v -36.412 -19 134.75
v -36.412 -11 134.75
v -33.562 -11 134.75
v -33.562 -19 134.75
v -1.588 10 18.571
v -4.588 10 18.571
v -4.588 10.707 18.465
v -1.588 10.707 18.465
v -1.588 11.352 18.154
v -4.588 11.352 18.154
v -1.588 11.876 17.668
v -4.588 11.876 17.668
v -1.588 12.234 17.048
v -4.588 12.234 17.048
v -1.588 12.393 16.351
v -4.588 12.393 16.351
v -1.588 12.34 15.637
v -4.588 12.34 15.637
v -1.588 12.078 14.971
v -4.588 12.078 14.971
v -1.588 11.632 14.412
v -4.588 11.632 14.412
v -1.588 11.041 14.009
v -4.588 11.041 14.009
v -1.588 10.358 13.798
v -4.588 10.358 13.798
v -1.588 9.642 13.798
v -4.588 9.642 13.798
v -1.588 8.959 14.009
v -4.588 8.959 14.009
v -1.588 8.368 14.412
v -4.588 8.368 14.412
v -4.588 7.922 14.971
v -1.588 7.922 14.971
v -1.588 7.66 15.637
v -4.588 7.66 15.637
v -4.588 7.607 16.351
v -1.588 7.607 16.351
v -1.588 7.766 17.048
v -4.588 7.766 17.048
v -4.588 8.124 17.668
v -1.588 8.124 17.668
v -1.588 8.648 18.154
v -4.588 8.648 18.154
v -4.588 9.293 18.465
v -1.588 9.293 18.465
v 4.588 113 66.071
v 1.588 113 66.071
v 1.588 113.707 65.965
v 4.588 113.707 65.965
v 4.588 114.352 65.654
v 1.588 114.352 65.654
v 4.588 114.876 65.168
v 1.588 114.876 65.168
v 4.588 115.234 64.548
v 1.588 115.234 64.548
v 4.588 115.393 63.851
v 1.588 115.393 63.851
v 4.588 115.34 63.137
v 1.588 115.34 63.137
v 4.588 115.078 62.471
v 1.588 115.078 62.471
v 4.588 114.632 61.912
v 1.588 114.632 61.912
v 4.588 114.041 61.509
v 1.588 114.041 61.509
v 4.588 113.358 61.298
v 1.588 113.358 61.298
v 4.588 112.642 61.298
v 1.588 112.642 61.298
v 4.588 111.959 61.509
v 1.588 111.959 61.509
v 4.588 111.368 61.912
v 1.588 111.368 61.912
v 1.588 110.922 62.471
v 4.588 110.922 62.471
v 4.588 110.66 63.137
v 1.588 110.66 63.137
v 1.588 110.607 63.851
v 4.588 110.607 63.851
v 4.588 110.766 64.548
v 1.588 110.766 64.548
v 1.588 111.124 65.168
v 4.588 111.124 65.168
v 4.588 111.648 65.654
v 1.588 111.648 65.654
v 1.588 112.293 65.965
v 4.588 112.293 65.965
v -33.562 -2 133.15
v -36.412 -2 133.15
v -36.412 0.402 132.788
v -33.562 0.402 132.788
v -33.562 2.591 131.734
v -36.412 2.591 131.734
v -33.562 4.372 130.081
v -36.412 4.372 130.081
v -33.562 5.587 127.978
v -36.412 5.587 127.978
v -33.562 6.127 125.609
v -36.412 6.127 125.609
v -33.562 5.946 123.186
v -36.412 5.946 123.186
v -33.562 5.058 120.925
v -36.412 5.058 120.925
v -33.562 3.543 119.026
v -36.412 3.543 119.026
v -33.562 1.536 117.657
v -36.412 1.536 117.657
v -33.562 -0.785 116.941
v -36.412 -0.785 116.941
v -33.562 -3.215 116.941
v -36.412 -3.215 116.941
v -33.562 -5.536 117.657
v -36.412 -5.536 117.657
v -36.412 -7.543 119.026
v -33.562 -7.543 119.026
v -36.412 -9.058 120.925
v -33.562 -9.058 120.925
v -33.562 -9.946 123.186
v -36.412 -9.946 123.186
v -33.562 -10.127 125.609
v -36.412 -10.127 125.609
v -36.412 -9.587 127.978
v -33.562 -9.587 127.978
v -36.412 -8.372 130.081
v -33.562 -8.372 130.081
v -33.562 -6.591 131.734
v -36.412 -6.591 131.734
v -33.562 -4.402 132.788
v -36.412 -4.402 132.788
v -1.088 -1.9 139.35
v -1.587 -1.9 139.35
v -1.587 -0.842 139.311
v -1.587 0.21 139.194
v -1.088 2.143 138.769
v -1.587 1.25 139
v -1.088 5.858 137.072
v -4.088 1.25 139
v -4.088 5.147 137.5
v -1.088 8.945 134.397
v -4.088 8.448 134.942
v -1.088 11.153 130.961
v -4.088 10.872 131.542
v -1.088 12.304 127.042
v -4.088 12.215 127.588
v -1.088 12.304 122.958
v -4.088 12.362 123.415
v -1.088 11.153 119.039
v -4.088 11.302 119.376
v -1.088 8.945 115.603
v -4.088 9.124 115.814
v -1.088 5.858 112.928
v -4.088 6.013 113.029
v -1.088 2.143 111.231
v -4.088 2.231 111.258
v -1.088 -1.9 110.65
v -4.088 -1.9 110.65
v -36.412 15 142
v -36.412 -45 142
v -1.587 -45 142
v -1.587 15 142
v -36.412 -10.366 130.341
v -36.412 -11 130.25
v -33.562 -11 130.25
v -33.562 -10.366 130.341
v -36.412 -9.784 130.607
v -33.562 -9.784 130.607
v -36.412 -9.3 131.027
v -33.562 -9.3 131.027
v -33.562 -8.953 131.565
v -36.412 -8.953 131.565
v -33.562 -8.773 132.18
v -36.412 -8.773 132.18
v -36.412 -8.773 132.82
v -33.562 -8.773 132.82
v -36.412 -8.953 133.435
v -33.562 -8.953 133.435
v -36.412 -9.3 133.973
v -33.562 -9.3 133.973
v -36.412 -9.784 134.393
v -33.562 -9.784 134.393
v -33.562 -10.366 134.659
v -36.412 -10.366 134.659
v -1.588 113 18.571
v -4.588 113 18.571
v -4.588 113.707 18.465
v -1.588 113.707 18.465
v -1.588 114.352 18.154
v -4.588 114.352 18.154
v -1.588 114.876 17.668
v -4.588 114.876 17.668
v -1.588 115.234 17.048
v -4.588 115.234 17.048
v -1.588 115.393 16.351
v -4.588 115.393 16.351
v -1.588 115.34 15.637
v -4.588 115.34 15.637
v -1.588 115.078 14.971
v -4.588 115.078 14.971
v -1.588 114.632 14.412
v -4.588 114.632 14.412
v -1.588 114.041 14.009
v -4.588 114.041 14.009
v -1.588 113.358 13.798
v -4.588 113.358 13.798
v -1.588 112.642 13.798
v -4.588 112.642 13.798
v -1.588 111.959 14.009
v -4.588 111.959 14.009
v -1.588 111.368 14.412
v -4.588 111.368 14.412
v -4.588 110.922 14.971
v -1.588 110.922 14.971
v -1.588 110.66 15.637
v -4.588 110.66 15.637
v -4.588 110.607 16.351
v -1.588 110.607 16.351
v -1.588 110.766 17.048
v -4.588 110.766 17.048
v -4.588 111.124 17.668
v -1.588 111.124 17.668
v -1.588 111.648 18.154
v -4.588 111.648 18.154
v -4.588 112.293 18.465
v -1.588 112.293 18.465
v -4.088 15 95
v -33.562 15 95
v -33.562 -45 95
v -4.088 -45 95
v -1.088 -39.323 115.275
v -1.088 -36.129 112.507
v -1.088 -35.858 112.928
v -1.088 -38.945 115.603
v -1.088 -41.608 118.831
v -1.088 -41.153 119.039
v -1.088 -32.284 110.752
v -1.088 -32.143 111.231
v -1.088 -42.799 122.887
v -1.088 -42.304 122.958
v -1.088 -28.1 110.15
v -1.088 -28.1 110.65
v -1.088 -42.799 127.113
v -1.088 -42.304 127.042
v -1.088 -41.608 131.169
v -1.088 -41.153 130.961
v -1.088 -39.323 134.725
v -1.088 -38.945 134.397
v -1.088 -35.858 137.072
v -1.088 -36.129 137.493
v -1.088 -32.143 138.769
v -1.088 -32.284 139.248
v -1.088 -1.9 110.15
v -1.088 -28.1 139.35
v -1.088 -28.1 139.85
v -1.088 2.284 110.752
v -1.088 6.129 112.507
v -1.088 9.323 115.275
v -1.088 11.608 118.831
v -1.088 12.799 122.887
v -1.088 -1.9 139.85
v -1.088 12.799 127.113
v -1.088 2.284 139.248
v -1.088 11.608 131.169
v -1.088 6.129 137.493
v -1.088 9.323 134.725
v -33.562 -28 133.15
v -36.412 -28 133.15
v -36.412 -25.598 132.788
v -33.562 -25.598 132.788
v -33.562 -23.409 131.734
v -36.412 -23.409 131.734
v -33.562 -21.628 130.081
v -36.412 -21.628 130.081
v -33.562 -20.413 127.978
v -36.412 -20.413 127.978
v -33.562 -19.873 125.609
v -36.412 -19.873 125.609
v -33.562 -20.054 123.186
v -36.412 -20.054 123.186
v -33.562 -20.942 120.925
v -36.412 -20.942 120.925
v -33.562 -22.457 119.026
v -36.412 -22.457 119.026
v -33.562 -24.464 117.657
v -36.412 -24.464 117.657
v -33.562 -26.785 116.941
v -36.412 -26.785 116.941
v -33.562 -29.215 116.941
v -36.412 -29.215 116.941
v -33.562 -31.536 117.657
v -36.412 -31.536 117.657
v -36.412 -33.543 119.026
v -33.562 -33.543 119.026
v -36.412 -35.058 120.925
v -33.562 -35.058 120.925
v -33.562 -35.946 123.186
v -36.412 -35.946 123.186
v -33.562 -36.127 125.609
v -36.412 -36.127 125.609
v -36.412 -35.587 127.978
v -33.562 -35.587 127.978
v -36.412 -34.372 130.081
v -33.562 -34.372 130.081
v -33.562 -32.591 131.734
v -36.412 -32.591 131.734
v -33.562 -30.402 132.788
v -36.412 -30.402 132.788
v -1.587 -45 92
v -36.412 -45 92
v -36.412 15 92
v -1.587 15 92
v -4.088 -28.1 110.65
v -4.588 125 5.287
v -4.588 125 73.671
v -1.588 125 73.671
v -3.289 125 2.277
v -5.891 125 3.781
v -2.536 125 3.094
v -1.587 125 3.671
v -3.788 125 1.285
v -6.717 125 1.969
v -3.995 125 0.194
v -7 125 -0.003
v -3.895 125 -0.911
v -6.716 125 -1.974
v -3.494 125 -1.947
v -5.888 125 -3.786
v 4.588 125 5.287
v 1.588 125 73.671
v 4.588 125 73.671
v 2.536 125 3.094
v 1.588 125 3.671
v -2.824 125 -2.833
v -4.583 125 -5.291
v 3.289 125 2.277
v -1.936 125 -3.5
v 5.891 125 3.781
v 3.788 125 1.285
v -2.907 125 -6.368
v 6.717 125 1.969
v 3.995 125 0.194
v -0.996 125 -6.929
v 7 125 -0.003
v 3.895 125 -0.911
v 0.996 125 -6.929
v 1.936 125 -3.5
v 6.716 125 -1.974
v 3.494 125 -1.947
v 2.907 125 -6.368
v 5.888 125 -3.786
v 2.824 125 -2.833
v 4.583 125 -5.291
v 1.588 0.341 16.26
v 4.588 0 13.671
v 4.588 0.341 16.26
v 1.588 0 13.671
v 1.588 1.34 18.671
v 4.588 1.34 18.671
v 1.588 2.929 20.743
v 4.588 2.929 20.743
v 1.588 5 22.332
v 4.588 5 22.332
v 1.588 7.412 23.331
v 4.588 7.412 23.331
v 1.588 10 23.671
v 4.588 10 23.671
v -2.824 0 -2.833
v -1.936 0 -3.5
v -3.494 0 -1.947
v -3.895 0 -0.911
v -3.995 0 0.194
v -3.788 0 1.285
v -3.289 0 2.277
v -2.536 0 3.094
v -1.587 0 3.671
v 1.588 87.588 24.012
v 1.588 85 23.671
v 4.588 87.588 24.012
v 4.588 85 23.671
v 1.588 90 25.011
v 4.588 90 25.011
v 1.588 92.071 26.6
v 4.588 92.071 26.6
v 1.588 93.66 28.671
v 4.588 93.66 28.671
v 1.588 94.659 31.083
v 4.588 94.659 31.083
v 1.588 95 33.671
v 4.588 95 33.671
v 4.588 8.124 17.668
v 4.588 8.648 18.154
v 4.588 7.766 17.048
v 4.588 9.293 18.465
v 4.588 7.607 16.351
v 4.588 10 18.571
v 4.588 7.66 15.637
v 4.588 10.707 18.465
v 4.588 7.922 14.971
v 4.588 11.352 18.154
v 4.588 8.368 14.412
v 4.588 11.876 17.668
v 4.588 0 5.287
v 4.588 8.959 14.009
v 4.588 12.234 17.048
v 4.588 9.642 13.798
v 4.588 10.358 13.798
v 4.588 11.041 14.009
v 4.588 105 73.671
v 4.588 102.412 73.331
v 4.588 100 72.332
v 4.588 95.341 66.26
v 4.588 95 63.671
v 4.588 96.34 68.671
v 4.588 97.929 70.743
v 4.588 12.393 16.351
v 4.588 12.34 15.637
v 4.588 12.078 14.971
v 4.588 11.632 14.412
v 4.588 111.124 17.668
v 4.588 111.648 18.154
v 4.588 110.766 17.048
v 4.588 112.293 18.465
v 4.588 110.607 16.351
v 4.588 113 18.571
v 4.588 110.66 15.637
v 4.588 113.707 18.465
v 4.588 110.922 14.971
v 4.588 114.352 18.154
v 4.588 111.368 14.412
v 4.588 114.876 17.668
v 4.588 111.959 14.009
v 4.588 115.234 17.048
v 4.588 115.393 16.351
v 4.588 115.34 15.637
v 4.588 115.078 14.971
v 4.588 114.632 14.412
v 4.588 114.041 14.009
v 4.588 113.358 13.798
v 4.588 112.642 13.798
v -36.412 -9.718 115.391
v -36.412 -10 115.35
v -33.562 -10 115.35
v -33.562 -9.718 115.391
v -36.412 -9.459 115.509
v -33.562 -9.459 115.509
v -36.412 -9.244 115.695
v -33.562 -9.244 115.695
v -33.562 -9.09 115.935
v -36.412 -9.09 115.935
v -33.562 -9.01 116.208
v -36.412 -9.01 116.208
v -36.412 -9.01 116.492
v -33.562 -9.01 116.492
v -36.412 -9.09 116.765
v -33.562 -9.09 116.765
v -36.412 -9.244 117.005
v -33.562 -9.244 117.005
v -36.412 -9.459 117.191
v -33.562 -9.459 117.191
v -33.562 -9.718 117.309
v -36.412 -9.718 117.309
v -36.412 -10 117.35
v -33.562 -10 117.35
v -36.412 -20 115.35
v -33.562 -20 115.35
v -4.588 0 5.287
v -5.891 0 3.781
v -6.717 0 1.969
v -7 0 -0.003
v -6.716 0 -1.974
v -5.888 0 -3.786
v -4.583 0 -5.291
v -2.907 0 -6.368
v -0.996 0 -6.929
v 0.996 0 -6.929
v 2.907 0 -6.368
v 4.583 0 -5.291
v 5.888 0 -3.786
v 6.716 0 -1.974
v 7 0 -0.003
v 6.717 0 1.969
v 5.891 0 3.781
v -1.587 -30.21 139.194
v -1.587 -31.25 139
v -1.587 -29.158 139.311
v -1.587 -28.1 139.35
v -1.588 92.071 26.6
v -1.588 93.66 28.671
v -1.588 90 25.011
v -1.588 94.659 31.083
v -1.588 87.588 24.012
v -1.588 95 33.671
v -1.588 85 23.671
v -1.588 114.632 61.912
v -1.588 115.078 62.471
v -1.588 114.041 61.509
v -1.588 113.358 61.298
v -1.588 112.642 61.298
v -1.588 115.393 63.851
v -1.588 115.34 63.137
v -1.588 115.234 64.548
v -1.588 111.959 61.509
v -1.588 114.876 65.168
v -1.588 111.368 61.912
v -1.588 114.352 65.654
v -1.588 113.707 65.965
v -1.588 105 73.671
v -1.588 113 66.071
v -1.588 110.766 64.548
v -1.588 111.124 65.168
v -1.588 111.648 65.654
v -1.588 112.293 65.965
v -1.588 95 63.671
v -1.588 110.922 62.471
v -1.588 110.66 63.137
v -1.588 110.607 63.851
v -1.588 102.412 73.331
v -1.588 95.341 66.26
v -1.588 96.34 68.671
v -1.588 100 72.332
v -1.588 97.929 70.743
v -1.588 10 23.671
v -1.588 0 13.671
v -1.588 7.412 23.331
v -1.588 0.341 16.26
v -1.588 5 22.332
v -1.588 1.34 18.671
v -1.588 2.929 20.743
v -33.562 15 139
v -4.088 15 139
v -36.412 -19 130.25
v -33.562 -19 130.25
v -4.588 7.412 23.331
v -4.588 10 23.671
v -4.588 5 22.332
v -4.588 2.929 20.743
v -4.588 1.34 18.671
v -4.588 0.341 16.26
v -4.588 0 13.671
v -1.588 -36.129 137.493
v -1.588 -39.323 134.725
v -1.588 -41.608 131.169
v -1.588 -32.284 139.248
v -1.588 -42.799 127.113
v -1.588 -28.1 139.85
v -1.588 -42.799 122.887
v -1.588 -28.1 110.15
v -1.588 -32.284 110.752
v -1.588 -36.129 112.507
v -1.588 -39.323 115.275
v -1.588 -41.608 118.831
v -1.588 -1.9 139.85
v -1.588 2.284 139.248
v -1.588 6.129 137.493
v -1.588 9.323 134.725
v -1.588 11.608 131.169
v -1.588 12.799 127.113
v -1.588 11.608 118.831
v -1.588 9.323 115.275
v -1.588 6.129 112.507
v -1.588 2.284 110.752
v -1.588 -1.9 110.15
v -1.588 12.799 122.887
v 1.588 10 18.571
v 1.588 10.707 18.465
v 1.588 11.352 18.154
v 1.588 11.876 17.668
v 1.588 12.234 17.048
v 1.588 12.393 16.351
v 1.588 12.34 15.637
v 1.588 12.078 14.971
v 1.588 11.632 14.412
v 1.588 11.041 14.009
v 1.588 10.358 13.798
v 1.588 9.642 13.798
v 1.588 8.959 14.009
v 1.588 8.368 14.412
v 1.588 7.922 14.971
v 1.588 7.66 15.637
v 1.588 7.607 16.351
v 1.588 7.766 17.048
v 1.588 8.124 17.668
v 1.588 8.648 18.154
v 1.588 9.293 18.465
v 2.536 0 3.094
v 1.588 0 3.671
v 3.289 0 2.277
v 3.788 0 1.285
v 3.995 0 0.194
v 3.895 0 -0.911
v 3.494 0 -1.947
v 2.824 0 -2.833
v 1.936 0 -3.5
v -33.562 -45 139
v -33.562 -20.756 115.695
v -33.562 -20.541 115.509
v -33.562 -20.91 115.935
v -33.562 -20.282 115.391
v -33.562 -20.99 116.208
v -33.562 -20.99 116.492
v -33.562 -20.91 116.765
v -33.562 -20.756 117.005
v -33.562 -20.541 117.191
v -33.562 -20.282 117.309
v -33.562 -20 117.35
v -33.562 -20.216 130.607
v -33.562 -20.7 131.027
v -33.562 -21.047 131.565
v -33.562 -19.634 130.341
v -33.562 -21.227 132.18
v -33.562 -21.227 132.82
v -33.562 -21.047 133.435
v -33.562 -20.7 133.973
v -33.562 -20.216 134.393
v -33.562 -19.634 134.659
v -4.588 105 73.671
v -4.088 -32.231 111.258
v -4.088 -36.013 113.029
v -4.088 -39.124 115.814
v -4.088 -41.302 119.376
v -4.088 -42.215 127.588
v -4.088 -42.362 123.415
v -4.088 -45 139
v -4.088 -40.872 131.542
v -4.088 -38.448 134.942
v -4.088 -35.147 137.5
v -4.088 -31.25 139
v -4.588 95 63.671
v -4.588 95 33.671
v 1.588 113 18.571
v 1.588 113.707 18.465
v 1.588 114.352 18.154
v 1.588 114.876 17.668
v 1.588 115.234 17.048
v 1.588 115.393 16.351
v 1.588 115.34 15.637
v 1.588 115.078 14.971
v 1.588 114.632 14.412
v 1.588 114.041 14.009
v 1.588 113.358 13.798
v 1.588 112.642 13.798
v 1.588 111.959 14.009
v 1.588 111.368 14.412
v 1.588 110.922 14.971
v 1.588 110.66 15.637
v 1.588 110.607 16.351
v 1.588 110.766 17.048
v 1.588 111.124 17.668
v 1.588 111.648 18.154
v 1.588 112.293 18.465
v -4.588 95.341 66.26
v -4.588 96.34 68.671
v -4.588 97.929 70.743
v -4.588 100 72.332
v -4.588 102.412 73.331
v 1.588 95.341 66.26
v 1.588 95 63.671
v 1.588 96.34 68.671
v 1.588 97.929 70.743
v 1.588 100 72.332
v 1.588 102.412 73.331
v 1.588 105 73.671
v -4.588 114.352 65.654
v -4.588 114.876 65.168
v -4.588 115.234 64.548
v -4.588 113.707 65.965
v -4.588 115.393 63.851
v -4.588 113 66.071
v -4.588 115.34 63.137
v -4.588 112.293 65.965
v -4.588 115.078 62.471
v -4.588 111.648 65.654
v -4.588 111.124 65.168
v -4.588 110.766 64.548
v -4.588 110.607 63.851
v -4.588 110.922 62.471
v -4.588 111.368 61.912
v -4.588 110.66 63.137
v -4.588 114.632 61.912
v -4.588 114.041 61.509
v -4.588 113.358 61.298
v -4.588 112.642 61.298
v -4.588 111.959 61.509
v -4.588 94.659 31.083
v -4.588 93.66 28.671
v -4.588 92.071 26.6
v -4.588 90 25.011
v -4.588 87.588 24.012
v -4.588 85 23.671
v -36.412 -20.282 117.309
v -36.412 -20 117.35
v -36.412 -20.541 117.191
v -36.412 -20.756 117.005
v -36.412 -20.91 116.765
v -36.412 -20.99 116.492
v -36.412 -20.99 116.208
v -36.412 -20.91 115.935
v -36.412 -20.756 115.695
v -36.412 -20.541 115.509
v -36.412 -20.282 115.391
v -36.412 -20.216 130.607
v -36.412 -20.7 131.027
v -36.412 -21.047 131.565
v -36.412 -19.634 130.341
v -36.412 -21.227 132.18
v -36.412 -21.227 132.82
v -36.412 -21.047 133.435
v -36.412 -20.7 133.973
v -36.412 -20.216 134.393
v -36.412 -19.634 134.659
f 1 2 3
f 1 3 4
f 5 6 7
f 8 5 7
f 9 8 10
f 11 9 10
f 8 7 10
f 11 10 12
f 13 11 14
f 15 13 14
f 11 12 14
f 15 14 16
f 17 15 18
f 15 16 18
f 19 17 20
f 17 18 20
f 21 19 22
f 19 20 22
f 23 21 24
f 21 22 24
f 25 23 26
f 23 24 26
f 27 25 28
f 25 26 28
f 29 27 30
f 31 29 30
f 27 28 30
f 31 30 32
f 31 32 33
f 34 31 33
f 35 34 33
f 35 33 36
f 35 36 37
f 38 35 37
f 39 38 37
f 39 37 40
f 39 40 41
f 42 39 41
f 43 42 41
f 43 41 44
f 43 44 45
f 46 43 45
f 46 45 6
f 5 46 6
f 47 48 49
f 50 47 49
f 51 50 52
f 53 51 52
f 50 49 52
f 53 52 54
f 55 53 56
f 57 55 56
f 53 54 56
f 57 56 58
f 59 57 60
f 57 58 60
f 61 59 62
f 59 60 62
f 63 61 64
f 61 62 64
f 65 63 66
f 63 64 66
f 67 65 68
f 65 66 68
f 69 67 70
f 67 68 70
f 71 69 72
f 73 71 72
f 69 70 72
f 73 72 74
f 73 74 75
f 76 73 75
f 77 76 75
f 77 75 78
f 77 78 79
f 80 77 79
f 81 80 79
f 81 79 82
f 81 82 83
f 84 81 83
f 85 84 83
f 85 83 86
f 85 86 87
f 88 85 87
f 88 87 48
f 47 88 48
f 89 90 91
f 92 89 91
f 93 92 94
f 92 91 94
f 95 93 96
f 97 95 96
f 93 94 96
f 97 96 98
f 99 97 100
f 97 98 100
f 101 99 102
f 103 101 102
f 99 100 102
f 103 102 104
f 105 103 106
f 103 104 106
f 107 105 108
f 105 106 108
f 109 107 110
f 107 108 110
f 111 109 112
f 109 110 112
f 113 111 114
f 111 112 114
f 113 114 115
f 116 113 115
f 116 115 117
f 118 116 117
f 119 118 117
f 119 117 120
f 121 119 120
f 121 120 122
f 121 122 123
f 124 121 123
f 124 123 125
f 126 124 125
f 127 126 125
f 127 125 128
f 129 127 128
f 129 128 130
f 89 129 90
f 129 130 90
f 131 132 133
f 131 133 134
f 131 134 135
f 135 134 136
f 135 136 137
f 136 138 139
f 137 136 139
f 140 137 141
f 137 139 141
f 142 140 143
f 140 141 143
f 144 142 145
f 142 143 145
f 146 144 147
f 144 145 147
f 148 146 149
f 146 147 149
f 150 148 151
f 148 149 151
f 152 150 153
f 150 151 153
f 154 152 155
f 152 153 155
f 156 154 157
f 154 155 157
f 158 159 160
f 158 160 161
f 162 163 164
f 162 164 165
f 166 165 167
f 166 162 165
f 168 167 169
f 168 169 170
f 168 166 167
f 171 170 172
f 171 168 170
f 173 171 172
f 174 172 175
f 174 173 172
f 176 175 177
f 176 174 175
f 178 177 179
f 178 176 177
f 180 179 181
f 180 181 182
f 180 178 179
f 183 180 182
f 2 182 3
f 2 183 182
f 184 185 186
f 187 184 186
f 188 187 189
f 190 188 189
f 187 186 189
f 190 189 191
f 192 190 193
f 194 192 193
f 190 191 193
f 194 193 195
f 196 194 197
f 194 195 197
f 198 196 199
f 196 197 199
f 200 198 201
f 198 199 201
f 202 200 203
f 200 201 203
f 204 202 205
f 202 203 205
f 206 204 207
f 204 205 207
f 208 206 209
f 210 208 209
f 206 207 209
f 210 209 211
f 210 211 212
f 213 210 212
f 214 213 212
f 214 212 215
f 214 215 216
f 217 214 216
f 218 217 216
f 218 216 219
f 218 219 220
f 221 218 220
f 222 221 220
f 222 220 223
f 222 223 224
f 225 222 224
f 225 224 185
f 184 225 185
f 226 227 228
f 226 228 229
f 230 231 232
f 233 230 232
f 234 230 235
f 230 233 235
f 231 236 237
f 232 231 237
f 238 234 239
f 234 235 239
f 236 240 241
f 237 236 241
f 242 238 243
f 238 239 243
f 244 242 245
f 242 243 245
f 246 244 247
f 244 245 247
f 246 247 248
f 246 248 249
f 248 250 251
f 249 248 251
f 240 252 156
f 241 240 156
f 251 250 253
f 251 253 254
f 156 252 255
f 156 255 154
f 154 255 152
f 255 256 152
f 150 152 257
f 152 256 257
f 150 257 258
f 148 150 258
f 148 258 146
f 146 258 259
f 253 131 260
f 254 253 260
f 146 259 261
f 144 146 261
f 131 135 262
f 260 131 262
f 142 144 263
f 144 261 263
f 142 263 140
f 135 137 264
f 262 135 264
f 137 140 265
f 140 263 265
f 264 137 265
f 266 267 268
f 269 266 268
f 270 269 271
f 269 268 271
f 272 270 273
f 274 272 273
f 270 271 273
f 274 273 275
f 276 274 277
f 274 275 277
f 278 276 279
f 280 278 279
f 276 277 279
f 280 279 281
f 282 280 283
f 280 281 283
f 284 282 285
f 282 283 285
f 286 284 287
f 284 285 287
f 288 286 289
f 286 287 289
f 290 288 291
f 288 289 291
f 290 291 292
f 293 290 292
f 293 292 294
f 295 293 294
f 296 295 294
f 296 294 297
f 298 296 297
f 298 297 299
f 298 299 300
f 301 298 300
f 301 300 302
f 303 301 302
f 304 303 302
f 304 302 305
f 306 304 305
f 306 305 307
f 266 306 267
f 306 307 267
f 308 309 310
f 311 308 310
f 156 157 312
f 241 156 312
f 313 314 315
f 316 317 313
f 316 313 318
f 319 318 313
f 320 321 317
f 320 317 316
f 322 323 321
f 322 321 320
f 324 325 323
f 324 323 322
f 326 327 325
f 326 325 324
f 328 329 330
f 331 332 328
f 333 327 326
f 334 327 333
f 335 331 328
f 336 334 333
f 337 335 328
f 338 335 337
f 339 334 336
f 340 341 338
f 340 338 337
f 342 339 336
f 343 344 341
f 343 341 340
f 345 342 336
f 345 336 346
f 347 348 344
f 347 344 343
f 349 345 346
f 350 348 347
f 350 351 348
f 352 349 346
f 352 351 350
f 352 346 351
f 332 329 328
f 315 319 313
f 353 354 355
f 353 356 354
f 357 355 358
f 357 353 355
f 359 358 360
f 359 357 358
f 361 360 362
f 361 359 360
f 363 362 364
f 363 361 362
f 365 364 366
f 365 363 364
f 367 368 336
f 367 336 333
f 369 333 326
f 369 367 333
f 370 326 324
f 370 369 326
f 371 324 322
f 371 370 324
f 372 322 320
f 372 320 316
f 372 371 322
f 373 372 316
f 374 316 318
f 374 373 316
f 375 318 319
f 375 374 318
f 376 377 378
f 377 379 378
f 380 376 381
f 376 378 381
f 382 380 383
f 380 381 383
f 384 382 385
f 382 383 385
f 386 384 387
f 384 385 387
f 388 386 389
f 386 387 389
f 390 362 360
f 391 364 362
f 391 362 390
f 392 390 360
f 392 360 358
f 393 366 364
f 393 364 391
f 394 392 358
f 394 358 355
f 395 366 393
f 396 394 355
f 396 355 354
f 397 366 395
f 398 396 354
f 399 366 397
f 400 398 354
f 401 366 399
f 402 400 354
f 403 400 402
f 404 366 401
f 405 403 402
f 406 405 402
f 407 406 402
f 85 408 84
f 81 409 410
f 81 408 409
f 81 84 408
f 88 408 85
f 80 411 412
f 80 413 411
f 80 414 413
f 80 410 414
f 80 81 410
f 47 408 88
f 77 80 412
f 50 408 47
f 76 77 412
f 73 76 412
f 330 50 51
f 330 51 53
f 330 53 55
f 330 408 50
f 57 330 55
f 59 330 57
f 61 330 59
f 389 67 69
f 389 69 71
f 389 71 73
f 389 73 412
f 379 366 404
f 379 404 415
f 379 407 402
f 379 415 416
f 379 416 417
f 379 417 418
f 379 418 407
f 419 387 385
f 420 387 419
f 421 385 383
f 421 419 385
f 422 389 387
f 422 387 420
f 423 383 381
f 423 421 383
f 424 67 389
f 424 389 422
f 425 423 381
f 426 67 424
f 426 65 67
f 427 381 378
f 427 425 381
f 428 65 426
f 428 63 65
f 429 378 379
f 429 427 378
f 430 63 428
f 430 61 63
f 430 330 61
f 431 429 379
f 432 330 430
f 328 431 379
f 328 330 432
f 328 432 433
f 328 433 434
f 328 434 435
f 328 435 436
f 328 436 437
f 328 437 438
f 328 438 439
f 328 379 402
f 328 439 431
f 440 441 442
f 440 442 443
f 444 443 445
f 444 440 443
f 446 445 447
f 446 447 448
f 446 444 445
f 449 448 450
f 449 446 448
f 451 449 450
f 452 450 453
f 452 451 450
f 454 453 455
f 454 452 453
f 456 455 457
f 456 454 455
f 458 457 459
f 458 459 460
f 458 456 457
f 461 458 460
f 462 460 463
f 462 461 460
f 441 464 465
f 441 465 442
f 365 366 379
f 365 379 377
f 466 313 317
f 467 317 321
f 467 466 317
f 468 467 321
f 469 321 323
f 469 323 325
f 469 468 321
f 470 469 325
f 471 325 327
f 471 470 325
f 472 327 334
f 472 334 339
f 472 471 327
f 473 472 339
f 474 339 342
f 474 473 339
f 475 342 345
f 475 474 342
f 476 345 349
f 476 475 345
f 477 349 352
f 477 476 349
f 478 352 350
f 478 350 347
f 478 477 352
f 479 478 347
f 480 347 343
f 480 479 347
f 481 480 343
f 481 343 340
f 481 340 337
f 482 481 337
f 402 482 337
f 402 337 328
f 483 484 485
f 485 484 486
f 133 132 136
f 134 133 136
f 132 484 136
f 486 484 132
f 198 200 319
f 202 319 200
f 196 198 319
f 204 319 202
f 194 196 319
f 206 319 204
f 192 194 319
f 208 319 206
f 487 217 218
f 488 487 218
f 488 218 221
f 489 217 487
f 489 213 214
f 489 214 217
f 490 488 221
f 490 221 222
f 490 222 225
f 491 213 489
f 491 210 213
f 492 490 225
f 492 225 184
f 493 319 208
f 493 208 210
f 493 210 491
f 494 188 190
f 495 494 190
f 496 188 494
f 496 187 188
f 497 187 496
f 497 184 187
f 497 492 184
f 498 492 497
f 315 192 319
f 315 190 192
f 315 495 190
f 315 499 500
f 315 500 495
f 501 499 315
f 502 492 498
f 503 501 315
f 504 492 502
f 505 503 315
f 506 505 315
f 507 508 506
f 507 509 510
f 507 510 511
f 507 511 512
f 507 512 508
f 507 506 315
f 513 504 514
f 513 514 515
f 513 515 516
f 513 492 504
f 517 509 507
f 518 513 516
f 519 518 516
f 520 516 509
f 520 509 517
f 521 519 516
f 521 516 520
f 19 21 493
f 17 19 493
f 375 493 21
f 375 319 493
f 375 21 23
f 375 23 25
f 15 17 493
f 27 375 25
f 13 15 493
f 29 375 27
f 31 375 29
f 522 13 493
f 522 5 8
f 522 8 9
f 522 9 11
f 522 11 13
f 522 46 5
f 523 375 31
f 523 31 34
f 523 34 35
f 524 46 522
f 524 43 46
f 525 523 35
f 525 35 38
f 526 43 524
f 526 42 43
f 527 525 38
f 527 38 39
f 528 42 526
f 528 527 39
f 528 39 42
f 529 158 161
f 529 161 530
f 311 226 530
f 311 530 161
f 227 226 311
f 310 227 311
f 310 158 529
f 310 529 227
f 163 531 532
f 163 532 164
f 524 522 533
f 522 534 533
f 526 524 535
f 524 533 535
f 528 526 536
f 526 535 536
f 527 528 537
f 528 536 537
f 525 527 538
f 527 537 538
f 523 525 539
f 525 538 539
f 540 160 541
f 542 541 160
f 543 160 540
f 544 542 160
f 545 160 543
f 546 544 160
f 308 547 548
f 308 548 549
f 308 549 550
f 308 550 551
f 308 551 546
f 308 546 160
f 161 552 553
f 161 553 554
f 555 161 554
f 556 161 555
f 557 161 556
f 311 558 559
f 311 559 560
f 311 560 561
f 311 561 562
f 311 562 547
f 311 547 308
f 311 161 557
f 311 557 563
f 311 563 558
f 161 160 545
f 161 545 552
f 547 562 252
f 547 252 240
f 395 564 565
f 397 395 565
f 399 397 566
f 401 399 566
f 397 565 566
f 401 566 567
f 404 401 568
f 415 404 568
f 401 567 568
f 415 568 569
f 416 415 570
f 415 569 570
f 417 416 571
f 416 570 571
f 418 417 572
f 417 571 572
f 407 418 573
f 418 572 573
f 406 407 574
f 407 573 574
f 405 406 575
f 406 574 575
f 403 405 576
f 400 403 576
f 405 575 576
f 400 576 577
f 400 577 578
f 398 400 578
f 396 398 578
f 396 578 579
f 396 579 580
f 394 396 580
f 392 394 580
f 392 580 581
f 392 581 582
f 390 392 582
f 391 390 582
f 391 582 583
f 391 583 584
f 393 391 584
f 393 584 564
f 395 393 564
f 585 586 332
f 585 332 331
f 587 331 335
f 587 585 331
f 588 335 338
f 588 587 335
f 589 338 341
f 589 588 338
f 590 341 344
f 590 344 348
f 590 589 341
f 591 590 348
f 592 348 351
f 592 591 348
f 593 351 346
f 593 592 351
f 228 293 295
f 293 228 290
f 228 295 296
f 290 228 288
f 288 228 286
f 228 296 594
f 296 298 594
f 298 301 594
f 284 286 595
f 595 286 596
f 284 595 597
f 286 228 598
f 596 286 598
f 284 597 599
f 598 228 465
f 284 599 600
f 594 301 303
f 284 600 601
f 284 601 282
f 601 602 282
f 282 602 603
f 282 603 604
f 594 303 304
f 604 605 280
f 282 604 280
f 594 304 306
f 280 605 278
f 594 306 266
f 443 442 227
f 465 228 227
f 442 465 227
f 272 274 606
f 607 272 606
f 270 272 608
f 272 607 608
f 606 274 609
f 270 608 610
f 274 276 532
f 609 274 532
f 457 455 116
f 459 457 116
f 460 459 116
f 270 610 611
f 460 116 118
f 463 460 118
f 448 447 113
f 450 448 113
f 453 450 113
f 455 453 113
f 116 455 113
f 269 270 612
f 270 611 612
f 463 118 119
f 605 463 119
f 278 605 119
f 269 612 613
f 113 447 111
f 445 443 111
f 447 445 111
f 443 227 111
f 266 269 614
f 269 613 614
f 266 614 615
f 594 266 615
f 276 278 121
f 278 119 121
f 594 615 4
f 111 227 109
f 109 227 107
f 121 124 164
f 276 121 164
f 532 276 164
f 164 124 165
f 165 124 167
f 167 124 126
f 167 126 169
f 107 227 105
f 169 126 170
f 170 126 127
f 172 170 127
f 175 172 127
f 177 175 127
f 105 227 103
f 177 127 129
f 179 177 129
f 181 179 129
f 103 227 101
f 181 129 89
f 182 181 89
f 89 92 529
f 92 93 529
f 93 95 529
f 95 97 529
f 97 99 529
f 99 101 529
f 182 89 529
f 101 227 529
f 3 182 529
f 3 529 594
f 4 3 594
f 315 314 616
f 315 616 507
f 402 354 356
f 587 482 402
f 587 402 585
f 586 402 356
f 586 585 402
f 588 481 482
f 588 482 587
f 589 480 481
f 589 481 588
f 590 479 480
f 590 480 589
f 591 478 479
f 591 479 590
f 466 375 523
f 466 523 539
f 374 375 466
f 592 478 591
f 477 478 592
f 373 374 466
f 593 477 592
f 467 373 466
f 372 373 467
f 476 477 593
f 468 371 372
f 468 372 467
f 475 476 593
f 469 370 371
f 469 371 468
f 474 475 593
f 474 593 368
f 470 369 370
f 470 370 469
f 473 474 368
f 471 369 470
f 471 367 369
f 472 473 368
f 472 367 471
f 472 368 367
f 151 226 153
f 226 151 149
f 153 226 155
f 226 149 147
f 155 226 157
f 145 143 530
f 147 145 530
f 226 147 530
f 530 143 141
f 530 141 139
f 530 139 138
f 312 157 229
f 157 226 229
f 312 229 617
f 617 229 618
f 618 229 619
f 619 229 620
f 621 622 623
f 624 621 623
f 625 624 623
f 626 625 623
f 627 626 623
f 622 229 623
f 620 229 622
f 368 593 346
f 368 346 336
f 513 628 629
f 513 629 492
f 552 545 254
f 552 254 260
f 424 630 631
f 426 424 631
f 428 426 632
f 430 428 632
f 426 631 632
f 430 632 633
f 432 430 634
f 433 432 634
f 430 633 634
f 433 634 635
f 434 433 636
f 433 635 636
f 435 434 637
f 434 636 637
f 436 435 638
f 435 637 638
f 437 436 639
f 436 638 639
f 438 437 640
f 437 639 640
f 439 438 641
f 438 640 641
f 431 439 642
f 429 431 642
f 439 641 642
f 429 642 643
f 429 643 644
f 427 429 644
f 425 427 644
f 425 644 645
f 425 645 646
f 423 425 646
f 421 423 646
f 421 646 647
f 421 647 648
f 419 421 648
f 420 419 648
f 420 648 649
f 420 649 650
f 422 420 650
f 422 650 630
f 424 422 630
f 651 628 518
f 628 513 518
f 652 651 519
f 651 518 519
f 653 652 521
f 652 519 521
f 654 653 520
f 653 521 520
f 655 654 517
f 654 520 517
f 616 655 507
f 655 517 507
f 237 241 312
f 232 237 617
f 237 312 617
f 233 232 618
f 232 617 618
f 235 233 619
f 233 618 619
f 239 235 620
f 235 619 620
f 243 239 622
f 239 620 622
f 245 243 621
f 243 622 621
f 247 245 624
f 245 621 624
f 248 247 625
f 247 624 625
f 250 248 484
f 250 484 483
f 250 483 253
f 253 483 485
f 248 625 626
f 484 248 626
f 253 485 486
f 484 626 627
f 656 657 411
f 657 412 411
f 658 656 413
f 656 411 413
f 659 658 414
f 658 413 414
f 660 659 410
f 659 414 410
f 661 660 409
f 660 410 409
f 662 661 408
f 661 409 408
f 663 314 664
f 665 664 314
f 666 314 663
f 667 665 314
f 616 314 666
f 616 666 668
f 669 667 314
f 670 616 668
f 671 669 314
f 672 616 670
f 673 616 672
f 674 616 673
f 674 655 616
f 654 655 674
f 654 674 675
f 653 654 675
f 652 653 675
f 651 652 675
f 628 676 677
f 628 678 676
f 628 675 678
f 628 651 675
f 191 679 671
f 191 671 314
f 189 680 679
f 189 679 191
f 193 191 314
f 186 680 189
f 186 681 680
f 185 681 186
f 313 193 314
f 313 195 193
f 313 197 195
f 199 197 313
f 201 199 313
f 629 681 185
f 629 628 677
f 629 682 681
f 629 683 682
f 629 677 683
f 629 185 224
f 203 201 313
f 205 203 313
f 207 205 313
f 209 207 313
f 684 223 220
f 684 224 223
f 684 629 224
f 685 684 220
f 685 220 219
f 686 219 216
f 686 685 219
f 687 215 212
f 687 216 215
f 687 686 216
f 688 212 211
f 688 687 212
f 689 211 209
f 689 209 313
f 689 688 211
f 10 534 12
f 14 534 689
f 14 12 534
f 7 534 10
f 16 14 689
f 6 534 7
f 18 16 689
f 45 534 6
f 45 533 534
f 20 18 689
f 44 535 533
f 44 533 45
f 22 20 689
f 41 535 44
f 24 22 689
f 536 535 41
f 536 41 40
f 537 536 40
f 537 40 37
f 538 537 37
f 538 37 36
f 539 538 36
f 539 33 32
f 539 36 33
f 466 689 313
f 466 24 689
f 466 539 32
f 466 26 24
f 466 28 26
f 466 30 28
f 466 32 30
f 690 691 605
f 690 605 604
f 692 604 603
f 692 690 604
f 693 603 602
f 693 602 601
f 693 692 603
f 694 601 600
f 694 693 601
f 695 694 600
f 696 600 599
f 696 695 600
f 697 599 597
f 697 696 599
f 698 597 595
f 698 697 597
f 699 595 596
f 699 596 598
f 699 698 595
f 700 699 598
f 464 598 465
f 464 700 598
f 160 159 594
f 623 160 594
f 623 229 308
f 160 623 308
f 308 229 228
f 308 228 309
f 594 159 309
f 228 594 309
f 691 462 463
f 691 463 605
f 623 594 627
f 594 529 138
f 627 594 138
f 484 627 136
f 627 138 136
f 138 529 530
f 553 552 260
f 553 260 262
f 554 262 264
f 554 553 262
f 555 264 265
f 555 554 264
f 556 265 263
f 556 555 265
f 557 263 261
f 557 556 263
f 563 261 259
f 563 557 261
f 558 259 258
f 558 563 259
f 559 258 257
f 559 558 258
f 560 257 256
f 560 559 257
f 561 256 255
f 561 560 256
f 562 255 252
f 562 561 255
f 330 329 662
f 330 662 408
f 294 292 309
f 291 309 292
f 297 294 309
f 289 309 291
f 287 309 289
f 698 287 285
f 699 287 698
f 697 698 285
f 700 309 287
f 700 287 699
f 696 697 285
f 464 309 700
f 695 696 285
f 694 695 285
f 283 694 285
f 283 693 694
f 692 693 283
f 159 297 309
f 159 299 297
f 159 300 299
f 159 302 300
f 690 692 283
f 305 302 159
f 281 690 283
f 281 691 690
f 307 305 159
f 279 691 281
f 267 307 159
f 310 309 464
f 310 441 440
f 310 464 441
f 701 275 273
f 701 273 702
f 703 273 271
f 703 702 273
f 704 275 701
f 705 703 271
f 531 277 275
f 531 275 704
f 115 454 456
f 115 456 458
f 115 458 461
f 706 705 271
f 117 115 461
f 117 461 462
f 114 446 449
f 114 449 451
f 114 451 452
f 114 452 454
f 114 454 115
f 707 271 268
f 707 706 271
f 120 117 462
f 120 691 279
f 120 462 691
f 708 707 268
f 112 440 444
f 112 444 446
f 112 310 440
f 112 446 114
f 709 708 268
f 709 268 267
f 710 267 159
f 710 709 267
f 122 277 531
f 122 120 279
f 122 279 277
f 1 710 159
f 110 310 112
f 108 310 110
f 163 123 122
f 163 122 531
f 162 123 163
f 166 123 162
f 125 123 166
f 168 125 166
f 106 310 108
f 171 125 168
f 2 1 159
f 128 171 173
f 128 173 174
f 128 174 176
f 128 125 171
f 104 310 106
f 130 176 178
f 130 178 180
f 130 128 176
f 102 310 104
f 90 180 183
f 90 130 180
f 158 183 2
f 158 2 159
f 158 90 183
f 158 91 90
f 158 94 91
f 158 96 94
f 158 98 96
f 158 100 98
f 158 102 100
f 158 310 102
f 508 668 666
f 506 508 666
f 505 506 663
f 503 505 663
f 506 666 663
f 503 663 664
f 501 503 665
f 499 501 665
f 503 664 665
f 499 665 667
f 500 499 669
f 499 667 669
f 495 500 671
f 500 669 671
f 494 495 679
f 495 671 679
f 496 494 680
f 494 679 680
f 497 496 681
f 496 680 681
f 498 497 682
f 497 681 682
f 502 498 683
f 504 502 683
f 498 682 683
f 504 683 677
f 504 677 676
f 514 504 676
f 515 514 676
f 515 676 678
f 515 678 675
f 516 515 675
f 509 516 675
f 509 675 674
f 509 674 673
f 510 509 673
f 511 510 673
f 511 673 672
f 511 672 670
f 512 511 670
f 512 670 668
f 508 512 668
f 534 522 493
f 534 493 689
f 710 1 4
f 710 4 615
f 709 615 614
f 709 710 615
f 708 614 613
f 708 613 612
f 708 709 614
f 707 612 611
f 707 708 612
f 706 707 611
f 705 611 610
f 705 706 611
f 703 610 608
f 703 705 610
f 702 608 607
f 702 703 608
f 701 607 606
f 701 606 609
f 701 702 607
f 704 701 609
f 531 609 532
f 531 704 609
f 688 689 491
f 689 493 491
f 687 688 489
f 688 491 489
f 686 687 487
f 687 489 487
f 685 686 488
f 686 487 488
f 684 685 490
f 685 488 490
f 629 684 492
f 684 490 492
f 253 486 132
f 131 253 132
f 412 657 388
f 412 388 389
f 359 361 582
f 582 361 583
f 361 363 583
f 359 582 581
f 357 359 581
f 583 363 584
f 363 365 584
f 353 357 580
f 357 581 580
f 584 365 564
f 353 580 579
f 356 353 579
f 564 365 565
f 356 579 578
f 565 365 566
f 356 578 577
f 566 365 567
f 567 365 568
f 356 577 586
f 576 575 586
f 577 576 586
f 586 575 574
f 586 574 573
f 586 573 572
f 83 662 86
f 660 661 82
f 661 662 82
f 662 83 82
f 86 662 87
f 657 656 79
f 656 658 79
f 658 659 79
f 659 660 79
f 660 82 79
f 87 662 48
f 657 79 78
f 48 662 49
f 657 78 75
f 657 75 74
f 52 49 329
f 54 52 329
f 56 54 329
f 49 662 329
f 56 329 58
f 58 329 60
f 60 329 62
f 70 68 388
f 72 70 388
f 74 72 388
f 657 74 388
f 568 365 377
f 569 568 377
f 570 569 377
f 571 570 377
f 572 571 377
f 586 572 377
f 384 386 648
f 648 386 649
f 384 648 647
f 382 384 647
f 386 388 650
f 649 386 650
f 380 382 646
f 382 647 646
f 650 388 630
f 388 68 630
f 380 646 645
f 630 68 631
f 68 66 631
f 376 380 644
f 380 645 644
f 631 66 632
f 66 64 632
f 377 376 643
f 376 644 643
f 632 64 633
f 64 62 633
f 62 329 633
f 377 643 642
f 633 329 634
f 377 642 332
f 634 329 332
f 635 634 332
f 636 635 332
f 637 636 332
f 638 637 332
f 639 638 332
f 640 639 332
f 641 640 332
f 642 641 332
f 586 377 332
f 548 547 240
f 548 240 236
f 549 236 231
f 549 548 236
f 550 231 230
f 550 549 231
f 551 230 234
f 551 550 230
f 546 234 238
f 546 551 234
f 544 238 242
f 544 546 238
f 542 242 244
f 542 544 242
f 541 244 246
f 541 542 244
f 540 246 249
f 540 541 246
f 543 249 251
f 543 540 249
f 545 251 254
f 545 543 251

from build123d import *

# Parameters (mm, degrees)
BOSS_EXTRUDE1_DEPTH  = 125
SKETCH6_W            = 3
SKETCH6_H            = 50
BOSS_EXTRUDE3_DEPTH  = 30
FILLET6_R            = 10
M4_CLEARANCE_HOLE1_D = 4.8
SKETCH16_W           = 50
SKETCH16_H           = 60
SKETCH16_R           = 8.15
BOSS_EXTRUDE9_DEPTH  = 2.85
SKETCH19_W           = 2.5
SKETCH19_H           = 60
BOSS_EXTRUDE11_DEPTH = 31.975
SKETCH20_W           = 2.5
SKETCH20_H           = 50
BOSS_EXTRUDE12_DEPTH = 60
CUT_EXTRUDE3_DEPTH   = 2.5
BOSS_EXTRUDE13_DEPTH = 0.5
BOSS_EXTRUDE10_START = -60
SKETCH18_W           = 34.825
SKETCH18_H           = 3
BOSS_EXTRUDE10_DEPTH = 60


with BuildPart() as part:
    # Sketch1 → Boss-Extrude1 (new body)
    with BuildSketch(Plane(origin=(0, 0, 0), x_dir=(1, 0, 0), z_dir=(0, 1, 0))):
        with BuildLine():
            Line((-1.5875, -3.671490671), (-1.5875, -23.671490671))
            Line((-1.5875, -23.671490671), (-4.5875, -23.671490671))
            Line((-4.5875, -23.671490671), (-4.5875, -5.287234036))
            ThreePointArc((-4.5875, -5.287234036), (0, 7), (4.5875, -5.287234036))
            Line((4.5875, -5.287234036), (4.5875, -23.671490671))
            Line((4.5875, -23.671490671), (1.5875, -23.671490671))
            Line((1.5875, -23.671490671), (1.5875, -3.671490671))
            ThreePointArc((1.5875, -3.671490671), (3.995272073, -0.194424946), (1.936491673, 3.5))
            Line((1.936491673, 3.5), (-1.936491673, 3.5))
            ThreePointArc((-1.936491673, 3.5), (-3.995272073, -0.194424946), (-1.5875, -3.671490671))
        make_face()
    extrude(amount=BOSS_EXTRUDE1_DEPTH)

    # Sketch6 → Boss-Extrude3 (add)
    with BuildSketch(Plane(origin=(0, 125, 0), x_dir=(1, 0, 0), z_dir=(0, 1, 0))):
        with Locations((3.0875, -48.671490671)):
            Rectangle(SKETCH6_W, SKETCH6_H)
        with Locations((-3.0875, -48.671490671)):
            Rectangle(SKETCH6_W, SKETCH6_H)
    extrude(amount=-BOSS_EXTRUDE3_DEPTH)

    # Fillet6
    fillet6_edges = [part.edges().sort_by_distance(p)[0] for p in [
        (-3.0875, 0, 23.671490671),
        (3.0875, 0, 23.671490671),
        (3.0875, 95, 23.671490671),
        (3.0875, 95, 73.671490671),
        (-3.0875, 95, 23.671490671),
        (-3.0875, 95, 73.671490671),
    ]]
    fillet(fillet6_edges, radius=FILLET6_R)

    # M4 Clearance Hole1 (through all)
    with Locations(Plane(origin=(4.5875, 0, 0), x_dir=(0, 0, -1), z_dir=(1, 0, 0))):
        with Locations((-16.171490671, 113), (-16.171490671, 10), (-63.671490671, 113)):
            Hole(M4_CLEARANCE_HOLE1_D / 2)


with BuildPart() as body_2:
    # Sketch16 → Boss-Extrude9 (new body)
    with BuildSketch(Plane.ZY.offset(36.4125)):
        with Locations((117, -15)):
            Rectangle(SKETCH16_W, SKETCH16_H)
        with Locations((125, -2)):
            Circle(SKETCH16_R, mode=Mode.SUBTRACT)
        with Locations((125, -28)):
            Circle(SKETCH16_R, mode=Mode.SUBTRACT)
        with BuildLine():
            Line((134.75, -11), (134.75, -19))
            ThreePointArc((134.75, -19), (132.5, -21.25), (130.25, -19))
            Line((130.25, -19), (130.25, -11))
            ThreePointArc((130.25, -11), (132.5, -8.75), (134.75, -11))
        make_face(mode=Mode.SUBTRACT)
        with BuildLine():
            Line((117.35, -10), (117.35, -20))
            ThreePointArc((117.35, -20), (116.35, -21), (115.35, -20))
            Line((115.35, -20), (115.35, -10))
            ThreePointArc((115.35, -10), (116.35, -9), (117.35, -10))
        make_face(mode=Mode.SUBTRACT)
    extrude(amount=-BOSS_EXTRUDE9_DEPTH)

    # Sketch19 → Boss-Extrude11 (add)
    with BuildSketch(Plane(origin=(-33.5625, 0, 0), x_dir=(0, 0, -1), z_dir=(1, 0, 0))):
        with Locations((-140.75, -15)):
            Rectangle(SKETCH19_W, SKETCH19_H)
        with Locations((-93.25, -15)):
            Rectangle(SKETCH19_W, SKETCH19_H)
    extrude(amount=BOSS_EXTRUDE11_DEPTH)

    # Sketch20 → Boss-Extrude12 (add)
    with BuildSketch(Plane.XZ.offset(45)):
        with Locations((-2.8375, 117)):
            Rectangle(SKETCH20_W, SKETCH20_H)
    extrude(amount=-BOSS_EXTRUDE12_DEPTH)

    # Sketch21<2> → Cut-Extrude3 (cut)
    with BuildSketch(Plane(origin=(-1.5875, 0, 0), x_dir=(0, 0, -1), z_dir=(1, 0, 0))):
        with BuildLine():
            Line((-110.65, -1.9), (-110.65, -28.1))
            ThreePointArc((-110.65, -28.1), (-125, -42.45), (-139.35, -28.1))
            Line((-139.35, -28.1), (-139.35, -1.9))
            ThreePointArc((-139.35, -1.9), (-125, 12.45), (-110.65, -1.9))
        make_face()
    extrude(amount=-CUT_EXTRUDE3_DEPTH, mode=Mode.SUBTRACT)

    # Sketch21 → Boss-Extrude13 (add)
    with BuildSketch(Plane(origin=(-1.5875, 0, 0), x_dir=(0, 0, -1), z_dir=(1, 0, 0))):
        with BuildLine():
            Line((-110.15, -1.9), (-110.15, -28.1))
            ThreePointArc((-110.15, -28.1), (-125, -42.95), (-139.85, -28.1))
            Line((-139.85, -28.1), (-139.85, -1.9))
            ThreePointArc((-139.85, -1.9), (-125, 12.95), (-110.15, -1.9))
        make_face()
        with BuildLine():
            Line((-110.65, -1.9), (-110.65, -28.1))
            ThreePointArc((-110.65, -28.1), (-125, -42.45), (-139.35, -28.1))
            Line((-139.35, -28.1), (-139.35, -1.9))
            ThreePointArc((-139.35, -1.9), (-125, 12.45), (-110.65, -1.9))
        make_face(mode=Mode.SUBTRACT)
    extrude(amount=BOSS_EXTRUDE13_DEPTH)

    # Sketch18 → Boss-Extrude10 (add)
    with BuildSketch(Plane.XZ.offset(45).offset(BOSS_EXTRUDE10_START)):
        with Locations((-19, 140.5)):
            Rectangle(SKETCH18_W, SKETCH18_H)
        with Locations((-19, 93.5)):
            Rectangle(SKETCH18_W, SKETCH18_H)
    extrude(amount=BOSS_EXTRUDE10_DEPTH)


solid = Compound([part.part, body_2.part])
